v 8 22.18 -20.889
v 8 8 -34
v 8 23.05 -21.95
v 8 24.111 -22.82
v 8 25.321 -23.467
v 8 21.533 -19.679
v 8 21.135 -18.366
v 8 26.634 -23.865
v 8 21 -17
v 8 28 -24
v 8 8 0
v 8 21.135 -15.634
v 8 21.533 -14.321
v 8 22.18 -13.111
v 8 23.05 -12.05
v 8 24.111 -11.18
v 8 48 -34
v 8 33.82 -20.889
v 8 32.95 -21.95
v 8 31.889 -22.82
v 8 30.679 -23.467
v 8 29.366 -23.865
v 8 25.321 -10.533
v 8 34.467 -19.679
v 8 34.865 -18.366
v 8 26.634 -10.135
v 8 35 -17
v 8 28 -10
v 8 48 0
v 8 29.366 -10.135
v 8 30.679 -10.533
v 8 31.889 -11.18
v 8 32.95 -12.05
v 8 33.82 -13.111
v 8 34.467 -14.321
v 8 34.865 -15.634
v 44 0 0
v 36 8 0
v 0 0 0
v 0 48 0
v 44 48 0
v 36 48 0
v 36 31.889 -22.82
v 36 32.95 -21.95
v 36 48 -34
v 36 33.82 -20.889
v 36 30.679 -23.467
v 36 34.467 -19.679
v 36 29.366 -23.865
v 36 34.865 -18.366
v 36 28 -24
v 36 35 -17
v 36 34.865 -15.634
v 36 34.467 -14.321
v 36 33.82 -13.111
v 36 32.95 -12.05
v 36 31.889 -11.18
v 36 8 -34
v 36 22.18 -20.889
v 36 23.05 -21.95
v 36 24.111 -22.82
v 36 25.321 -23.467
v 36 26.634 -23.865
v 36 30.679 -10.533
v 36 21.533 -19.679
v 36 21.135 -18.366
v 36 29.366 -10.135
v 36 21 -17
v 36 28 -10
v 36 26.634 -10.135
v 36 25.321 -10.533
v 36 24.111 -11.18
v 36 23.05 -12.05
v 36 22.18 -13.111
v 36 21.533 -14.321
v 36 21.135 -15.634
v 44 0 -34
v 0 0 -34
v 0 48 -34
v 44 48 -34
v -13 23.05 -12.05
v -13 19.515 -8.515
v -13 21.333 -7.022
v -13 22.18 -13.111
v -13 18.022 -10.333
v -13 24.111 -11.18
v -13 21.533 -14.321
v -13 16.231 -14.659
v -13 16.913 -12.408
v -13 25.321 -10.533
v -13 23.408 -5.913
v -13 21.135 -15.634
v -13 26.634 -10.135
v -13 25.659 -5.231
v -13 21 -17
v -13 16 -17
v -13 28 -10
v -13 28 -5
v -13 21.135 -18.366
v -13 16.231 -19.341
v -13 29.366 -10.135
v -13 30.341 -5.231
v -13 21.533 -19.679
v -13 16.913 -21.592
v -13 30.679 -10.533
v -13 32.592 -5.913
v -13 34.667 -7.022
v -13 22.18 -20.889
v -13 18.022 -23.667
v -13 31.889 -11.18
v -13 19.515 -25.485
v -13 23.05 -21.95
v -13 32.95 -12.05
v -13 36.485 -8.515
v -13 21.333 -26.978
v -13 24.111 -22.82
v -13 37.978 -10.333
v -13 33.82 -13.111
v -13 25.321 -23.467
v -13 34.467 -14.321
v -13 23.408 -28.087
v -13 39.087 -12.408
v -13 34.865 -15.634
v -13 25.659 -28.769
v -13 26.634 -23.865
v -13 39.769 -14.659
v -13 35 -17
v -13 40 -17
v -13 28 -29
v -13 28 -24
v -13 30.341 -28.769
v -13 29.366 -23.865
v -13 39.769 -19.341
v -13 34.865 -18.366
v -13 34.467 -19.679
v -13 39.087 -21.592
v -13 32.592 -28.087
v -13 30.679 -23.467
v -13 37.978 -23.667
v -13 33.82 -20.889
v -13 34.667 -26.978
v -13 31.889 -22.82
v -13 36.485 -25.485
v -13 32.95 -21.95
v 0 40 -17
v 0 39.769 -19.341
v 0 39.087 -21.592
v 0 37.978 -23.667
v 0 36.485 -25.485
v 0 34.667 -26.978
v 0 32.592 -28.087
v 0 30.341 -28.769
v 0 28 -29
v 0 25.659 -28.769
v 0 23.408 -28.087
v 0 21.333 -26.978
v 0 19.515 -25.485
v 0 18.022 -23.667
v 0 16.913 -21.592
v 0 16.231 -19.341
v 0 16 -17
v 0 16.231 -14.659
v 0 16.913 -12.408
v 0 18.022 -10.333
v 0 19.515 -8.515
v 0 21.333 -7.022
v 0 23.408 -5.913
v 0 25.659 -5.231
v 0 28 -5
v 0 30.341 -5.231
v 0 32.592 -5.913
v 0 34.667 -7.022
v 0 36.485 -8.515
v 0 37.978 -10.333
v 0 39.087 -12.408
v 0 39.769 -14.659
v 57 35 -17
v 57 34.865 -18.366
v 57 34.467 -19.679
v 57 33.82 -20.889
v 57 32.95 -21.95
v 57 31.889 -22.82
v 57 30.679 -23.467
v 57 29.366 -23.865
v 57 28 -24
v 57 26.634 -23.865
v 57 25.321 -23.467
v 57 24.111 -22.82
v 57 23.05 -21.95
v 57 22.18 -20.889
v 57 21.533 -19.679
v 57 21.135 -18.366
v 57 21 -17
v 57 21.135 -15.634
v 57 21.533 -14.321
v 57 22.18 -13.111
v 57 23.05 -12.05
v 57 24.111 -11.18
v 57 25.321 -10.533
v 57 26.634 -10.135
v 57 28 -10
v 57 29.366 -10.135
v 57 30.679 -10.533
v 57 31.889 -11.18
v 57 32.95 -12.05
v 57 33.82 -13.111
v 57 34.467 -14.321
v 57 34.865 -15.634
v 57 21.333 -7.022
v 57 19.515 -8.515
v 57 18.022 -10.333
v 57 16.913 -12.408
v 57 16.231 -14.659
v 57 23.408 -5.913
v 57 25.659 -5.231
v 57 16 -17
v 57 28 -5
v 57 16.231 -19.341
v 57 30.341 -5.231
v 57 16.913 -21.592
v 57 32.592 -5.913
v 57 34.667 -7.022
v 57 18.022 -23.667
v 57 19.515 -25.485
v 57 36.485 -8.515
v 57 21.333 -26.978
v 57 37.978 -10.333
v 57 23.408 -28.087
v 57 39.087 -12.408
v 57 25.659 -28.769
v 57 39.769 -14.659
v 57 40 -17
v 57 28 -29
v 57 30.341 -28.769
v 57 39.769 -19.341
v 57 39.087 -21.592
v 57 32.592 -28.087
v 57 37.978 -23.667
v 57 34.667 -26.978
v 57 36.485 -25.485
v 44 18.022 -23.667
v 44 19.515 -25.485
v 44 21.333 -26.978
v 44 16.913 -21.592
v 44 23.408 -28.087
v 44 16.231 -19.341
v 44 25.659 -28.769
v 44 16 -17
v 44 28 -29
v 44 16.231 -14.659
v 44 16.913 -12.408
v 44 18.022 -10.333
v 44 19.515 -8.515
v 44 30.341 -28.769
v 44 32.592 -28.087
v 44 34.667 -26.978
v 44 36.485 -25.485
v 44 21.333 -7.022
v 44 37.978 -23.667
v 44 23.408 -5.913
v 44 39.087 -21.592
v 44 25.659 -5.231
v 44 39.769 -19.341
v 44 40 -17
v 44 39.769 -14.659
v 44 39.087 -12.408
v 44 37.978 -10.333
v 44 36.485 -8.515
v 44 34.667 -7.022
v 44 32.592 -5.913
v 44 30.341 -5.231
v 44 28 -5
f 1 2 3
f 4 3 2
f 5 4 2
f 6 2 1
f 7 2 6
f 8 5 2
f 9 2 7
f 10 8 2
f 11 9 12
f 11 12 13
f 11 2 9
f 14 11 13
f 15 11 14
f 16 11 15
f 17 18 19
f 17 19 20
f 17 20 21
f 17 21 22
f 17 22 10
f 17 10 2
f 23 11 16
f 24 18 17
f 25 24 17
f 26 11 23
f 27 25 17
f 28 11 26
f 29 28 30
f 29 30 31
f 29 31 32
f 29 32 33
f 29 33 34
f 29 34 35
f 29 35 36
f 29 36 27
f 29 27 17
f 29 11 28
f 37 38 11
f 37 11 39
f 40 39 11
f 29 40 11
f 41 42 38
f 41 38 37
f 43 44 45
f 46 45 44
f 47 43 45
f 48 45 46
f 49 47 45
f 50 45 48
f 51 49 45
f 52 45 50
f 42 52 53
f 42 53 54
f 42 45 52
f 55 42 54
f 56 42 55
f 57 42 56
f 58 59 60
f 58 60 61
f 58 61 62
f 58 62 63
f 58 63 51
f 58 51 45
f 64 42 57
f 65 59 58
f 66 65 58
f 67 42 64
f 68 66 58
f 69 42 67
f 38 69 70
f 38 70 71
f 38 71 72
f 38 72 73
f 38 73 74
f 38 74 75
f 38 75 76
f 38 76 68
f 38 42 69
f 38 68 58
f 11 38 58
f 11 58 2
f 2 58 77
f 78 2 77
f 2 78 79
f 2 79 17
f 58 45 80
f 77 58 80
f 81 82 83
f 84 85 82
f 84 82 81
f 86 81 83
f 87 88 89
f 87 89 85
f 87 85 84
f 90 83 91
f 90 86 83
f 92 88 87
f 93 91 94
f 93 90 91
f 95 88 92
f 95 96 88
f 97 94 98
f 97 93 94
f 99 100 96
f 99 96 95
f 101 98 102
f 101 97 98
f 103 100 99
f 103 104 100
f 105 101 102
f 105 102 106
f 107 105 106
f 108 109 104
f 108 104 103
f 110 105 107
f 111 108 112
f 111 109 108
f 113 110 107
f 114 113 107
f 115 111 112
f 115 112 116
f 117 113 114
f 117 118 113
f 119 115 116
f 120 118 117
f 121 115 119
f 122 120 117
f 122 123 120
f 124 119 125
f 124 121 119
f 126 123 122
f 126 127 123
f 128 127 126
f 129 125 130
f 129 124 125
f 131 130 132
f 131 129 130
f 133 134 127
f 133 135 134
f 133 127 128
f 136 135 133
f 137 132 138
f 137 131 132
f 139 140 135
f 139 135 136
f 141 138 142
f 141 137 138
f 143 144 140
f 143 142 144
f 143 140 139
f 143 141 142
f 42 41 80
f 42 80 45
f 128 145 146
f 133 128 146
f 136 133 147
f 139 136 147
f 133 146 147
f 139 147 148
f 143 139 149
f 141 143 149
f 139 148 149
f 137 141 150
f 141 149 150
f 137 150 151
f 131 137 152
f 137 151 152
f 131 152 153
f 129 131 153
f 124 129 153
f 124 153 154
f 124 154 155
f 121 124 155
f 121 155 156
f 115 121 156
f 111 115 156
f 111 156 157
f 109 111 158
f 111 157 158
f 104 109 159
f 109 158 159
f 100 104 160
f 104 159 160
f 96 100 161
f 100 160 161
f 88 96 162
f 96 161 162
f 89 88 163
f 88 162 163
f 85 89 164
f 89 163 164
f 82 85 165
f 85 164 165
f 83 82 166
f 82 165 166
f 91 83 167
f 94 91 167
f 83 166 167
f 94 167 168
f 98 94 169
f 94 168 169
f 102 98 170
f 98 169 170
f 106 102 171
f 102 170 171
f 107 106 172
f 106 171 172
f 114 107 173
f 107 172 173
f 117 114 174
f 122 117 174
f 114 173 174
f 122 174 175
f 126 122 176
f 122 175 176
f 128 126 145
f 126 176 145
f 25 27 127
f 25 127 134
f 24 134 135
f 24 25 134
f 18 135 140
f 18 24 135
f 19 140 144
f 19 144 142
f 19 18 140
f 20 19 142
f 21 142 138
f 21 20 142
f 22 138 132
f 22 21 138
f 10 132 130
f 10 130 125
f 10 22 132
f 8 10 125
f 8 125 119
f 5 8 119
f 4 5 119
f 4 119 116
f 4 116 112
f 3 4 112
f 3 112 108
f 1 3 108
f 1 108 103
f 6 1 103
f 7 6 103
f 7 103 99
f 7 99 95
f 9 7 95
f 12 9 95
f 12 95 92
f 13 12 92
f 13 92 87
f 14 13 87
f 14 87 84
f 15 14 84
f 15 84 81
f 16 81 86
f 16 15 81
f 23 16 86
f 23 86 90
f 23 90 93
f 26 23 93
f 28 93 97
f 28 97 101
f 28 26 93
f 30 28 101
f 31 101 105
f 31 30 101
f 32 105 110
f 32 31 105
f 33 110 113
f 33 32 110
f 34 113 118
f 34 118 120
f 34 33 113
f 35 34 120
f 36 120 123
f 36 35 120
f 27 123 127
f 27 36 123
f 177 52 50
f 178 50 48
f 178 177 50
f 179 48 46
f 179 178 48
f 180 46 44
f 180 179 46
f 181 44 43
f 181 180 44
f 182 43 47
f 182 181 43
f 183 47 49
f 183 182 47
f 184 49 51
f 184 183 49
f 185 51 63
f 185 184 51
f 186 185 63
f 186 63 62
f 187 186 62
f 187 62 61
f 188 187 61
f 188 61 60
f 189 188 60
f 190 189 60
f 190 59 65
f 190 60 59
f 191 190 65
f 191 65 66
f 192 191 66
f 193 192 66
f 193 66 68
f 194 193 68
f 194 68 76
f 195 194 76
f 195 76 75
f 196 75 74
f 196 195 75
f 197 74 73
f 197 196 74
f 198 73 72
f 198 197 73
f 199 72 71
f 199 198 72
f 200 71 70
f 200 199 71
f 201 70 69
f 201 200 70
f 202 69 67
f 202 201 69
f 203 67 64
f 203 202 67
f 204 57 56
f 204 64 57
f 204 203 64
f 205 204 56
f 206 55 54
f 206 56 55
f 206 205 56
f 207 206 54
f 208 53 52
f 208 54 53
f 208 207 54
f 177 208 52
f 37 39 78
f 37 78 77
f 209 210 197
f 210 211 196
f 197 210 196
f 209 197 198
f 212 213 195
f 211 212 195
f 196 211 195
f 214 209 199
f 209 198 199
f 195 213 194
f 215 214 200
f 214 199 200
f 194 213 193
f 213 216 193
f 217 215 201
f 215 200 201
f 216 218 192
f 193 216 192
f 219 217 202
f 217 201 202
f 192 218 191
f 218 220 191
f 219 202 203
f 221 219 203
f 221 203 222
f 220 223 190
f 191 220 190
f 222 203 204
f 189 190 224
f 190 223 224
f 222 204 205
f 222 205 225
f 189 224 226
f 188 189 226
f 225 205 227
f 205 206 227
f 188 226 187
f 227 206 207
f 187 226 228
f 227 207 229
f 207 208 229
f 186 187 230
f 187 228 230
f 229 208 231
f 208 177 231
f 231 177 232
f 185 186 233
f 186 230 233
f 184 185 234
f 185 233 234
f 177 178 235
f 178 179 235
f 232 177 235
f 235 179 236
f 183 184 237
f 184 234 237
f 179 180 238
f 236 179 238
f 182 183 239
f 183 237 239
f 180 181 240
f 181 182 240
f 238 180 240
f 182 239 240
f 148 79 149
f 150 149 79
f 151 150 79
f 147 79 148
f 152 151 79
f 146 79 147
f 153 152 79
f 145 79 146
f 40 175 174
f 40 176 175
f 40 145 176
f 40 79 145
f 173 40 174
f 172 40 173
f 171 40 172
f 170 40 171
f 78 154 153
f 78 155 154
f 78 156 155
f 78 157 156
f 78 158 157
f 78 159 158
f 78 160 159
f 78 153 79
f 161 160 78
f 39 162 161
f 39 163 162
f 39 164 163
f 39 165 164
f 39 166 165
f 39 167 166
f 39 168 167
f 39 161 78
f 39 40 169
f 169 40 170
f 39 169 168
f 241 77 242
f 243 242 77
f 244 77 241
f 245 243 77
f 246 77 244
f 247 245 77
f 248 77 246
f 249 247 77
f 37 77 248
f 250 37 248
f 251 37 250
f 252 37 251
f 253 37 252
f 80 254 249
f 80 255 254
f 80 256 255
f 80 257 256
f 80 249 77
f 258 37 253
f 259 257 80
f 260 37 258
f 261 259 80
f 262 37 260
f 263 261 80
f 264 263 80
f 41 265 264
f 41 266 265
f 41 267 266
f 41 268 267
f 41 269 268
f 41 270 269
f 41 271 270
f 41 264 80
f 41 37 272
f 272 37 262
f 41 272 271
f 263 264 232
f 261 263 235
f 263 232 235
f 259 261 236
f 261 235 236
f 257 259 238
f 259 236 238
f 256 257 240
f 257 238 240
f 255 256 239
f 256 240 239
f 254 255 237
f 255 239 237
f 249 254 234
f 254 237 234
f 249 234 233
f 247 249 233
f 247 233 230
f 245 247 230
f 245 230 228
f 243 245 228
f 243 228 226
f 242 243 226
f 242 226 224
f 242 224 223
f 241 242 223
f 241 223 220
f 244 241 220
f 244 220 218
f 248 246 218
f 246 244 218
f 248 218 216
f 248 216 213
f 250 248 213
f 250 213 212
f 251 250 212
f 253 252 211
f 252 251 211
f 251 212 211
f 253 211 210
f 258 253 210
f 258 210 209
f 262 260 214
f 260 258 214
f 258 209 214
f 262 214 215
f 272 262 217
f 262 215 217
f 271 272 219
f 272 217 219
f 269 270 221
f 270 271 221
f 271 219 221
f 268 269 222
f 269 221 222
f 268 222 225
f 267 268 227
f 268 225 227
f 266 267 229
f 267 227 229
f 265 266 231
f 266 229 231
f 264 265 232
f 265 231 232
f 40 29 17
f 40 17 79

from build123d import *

# Parameters (mm, degrees)
BOSS_EXTRUDE1_DEPTH = 34
SKETCH2_R           = 12
SKETCH2_R_2         = 7
BOSS_EXTRUDE3_DEPTH = 13
BOSS_EXTRUDE5_START = -21
SKETCH4_R           = 12
SKETCH4_R_2         = 7
BOSS_EXTRUDE5_DEPTH = 21
SKETCH9_R           = 7
CUT_EXTRUDE1_DEPTH  = 8
CUT_EXTRUDE2_START  = -8
SKETCH10_R          = 7
CUT_EXTRUDE2_DEPTH  = 8


with BuildPart() as part:
    # Sketch1 → Boss-Extrude1 (new body)
    with BuildSketch(Plane.XY):
        Polygon((0, 0), (44, 0), (44, 48), (36, 48), (36, 8), (8, 8), (8, 48), (0, 48), align=None)
    extrude(amount=-BOSS_EXTRUDE1_DEPTH)

    # Sketch2 → Boss-Extrude3 (add)
    with BuildSketch(Plane.ZY):
        with Locations(Location((-17, 28, 0), (0, 0, 90))):
            Circle(SKETCH2_R)
        with Locations(Location((-17, 28, 0), (0, 0, 90))):
            Circle(SKETCH2_R_2, mode=Mode.SUBTRACT)
    extrude(amount=BOSS_EXTRUDE3_DEPTH)

    # Sketch4 → Boss-Extrude5 (add)
    with BuildSketch(Plane.ZY.offset(-36).offset(BOSS_EXTRUDE5_START)):
        with Locations(Location((-17, 28, 0), (0, 0, 90))):
            Circle(SKETCH4_R)
        with Locations(Location((-17, 28, 0), (0, 0, 90))):
            Circle(SKETCH4_R_2, mode=Mode.SUBTRACT)
    extrude(amount=BOSS_EXTRUDE5_DEPTH)

    # Sketch9 → Cut-Extrude1 (cut)
    with BuildSketch(Plane(origin=(44, 0, 0), x_dir=(0, 0, -1), z_dir=(1, 0, 0))):
        with Locations(Location((17, 28, 0), (0, 0, 90))):
            Circle(SKETCH9_R)
    extrude(amount=-CUT_EXTRUDE1_DEPTH, mode=Mode.SUBTRACT)

    # Sketch10 → Cut-Extrude2 (cut)
    with BuildSketch(Plane.ZY.offset(CUT_EXTRUDE2_START)):
        with Locations(Location((-17, 28, 0), (0, 0, 90))):
            Circle(SKETCH10_R)
    extrude(amount=CUT_EXTRUDE2_DEPTH, mode=Mode.SUBTRACT)


solid = part.part
